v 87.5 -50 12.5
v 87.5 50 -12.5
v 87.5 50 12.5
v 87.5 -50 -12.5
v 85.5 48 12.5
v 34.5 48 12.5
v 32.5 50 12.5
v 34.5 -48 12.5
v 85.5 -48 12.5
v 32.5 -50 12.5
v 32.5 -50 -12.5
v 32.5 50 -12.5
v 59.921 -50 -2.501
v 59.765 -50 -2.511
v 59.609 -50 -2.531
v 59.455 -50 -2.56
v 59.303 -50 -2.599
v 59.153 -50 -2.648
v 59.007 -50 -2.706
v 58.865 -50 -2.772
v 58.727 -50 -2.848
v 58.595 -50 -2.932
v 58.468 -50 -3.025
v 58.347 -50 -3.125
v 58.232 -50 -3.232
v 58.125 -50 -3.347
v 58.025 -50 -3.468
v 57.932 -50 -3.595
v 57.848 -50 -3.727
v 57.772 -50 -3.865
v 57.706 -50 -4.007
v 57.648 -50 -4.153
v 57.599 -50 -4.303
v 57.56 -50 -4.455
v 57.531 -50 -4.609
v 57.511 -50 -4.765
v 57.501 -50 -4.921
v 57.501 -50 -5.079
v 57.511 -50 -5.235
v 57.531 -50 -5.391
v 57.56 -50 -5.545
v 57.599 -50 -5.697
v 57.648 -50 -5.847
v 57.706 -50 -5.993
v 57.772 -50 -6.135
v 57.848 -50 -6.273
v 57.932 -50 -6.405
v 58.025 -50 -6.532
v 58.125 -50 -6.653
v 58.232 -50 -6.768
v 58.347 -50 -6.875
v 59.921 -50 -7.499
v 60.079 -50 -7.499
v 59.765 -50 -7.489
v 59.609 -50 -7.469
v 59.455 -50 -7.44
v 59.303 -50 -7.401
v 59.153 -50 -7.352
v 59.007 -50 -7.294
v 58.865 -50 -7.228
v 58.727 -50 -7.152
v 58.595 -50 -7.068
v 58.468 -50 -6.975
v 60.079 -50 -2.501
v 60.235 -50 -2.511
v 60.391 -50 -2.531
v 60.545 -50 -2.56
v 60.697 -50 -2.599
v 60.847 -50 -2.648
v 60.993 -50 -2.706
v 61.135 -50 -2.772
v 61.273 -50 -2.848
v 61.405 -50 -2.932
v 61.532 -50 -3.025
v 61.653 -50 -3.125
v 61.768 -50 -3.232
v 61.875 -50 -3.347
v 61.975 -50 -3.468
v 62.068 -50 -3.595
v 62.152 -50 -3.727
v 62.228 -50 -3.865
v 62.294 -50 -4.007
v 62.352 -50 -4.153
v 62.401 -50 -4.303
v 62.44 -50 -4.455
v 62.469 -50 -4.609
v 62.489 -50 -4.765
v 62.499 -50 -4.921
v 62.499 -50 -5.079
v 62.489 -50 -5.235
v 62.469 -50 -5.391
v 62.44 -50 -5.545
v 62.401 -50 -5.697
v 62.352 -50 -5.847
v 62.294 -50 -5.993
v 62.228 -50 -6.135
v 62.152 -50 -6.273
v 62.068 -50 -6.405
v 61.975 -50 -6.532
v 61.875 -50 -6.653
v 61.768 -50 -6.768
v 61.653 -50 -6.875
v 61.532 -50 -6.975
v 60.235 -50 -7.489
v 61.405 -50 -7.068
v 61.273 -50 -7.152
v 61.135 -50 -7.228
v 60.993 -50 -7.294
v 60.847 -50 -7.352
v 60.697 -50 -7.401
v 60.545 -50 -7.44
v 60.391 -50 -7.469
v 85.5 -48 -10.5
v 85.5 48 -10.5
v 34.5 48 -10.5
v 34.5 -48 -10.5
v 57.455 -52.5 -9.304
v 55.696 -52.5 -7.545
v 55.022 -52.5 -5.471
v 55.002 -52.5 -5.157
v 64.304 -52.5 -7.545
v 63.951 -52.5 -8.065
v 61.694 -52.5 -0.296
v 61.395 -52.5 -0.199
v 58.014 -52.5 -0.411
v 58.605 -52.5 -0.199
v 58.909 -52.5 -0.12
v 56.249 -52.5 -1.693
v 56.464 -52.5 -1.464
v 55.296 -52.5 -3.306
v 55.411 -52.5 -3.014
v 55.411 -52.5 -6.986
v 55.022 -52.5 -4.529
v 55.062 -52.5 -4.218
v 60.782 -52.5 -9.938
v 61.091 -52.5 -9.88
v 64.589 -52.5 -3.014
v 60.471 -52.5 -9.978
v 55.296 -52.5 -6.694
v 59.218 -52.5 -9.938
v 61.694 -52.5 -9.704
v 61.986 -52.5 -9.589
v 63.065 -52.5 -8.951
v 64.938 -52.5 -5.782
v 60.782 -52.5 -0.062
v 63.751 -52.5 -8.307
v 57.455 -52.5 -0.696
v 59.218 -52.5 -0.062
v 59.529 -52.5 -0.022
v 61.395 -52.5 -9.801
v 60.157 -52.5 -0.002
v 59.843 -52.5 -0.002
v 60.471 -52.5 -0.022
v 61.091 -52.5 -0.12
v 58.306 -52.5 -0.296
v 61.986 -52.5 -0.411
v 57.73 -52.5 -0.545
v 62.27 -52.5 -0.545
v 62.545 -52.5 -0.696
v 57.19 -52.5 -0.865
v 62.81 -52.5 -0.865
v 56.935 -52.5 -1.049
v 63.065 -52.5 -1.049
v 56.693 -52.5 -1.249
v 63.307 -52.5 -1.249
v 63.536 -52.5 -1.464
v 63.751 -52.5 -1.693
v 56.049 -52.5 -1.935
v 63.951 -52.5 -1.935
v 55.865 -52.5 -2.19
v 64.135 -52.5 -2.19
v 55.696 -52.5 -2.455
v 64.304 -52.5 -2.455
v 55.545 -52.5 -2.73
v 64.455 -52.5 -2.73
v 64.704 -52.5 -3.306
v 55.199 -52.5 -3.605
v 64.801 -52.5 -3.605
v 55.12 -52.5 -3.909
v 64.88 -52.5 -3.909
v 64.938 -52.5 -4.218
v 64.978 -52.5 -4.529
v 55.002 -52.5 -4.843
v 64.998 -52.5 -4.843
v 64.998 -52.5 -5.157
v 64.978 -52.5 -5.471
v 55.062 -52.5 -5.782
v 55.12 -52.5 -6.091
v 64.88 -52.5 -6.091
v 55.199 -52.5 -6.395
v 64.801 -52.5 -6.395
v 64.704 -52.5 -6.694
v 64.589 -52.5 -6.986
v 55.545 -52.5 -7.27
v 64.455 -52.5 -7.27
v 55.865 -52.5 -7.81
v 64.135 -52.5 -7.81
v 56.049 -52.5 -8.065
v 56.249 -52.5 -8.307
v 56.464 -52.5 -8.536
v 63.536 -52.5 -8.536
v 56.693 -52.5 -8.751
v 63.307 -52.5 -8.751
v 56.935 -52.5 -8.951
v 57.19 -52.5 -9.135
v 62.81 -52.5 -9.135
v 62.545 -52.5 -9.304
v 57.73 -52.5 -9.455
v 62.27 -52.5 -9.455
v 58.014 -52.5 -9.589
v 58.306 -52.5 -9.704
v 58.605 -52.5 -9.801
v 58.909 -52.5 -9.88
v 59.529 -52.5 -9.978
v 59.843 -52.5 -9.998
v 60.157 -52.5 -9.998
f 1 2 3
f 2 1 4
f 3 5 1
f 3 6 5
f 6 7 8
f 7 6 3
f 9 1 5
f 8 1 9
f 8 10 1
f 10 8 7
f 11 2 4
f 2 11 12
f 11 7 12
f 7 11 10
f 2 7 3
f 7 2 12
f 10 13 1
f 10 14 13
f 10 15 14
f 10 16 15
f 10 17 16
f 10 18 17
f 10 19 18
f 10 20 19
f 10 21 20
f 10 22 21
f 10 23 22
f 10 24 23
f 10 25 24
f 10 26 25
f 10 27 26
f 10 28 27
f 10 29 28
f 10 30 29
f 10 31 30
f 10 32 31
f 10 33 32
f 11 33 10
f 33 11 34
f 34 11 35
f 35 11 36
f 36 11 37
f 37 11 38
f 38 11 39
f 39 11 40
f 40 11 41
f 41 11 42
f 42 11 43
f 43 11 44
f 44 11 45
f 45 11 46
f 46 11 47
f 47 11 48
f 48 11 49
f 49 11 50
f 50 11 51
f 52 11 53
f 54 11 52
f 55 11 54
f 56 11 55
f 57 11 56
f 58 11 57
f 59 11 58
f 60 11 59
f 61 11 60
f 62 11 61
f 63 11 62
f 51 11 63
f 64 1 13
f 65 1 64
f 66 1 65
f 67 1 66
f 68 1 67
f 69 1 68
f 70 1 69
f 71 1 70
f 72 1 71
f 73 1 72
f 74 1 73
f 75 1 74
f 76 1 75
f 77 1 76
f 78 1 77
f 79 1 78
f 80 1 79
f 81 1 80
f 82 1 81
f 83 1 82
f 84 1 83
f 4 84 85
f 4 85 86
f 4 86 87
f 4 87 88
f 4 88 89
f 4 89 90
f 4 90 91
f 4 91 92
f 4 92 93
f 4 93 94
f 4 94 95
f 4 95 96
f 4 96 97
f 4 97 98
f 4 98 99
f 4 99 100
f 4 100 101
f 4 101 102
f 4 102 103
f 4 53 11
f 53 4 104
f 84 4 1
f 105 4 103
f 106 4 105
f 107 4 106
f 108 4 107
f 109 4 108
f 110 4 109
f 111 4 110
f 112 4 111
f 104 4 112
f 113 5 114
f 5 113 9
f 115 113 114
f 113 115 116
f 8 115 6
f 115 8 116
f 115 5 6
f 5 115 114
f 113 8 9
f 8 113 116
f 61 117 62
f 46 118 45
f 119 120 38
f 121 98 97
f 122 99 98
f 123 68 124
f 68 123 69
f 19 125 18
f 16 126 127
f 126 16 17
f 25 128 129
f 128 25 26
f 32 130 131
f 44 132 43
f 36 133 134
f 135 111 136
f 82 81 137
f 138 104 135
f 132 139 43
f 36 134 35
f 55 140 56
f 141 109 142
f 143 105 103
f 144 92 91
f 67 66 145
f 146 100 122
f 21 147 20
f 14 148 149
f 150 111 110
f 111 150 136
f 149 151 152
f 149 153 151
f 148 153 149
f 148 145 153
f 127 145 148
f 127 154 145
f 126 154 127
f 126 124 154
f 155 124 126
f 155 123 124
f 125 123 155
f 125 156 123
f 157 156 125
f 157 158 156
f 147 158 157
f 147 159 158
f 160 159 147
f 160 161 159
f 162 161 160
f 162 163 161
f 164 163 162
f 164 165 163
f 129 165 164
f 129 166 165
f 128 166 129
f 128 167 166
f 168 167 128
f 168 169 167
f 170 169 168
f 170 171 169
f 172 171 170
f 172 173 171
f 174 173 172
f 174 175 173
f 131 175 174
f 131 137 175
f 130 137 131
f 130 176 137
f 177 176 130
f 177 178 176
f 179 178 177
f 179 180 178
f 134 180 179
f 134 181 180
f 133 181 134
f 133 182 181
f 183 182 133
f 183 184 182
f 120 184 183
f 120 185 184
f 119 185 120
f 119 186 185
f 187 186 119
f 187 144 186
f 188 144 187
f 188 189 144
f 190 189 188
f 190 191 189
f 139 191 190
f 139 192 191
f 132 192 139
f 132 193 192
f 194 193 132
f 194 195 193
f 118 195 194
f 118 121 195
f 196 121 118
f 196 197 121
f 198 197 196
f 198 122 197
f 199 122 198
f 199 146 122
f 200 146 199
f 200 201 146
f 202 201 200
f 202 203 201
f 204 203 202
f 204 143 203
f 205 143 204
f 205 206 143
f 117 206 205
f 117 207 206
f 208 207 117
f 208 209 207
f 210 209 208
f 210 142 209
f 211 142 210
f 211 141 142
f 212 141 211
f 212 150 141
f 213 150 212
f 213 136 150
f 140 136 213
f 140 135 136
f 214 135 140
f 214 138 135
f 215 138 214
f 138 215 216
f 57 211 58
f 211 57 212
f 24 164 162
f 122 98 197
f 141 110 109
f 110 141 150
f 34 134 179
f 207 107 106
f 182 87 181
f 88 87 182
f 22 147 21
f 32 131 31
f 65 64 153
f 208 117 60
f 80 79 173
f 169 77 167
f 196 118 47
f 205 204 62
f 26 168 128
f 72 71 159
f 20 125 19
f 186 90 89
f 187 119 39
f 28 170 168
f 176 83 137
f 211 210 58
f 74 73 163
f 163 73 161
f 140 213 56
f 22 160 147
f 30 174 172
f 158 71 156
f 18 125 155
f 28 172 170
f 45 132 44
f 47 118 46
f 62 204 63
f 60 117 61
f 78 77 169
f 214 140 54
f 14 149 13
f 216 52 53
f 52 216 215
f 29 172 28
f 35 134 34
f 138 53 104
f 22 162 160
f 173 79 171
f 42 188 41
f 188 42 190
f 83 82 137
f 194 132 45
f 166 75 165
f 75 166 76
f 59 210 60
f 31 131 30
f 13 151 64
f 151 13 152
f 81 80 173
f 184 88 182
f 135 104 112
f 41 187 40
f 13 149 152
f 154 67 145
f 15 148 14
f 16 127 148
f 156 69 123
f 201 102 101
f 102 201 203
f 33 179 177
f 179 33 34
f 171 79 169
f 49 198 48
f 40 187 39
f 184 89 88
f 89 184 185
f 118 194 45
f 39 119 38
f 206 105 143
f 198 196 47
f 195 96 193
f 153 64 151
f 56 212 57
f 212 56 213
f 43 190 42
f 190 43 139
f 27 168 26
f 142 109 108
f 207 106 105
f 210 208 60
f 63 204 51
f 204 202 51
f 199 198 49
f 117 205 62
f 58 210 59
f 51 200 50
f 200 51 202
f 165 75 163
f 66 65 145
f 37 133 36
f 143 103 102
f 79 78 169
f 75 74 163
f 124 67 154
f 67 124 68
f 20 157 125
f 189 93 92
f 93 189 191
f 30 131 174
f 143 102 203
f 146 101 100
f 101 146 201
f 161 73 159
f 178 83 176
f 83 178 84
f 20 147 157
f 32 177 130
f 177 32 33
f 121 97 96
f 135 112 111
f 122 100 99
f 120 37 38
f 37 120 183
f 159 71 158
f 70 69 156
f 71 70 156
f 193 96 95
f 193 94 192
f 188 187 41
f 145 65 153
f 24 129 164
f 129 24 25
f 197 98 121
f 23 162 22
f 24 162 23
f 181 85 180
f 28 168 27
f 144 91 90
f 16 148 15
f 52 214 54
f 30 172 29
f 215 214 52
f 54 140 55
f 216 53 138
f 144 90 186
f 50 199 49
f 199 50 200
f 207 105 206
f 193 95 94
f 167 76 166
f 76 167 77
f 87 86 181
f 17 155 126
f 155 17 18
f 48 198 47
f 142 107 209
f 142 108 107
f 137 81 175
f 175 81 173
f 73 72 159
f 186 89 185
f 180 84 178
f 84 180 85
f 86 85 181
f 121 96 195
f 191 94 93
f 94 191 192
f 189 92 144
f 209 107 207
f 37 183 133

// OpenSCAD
/////////
//setup//
/////////

// use this to change the space between the holders for x axis
xSpace = 30;

// the number of holders in the x dimention
xHolders = 2;

// use this to change the space between the holders for z axis
zSpace = 30;

// the number of holders in the z dimention
zHolders = 1;

// the tolerance for holding mounts
holderTolerance = .3;

// the lenth of drawers
lenth = 100;

// for tolerance of printer for wall
wallTolerance = 1;

// the thickness of case wall
caseWallThickness = 2;

// if you want the holders to be auto generated
autoGeneratedHolder = 1;

// with of holder
hWith = 5;

//with of side holders
sHWith = 5;

// the thickness of the backplate
bPThickness = 1;

// the thickness for the Top Holder Plate
TopHolderPlateThickness = 1;

// the overlap of Top Holder Plate
TopHolderPlateOverlap = 5;

// the thickness for the right Holder Plate
rightHolderPlateThickness = 1;

// the overlap of right Holder Plate
rightHolderPlateOverlap = 5;

// the thickness of the drawer walls
dWThickness = 2;

// the thickiness of the drawerbottom
dBThickness = 2;

// the diamiter of the knob
kDiamiter = 10;

// the lenth of the knob
kLenth = 2.5;

// the knob type
knobT = 4;

//the offset of the knob(-offset = down and +offset = up )
knobO = -5;

knobR = 2;

knobPlateThickness = 1;

/////////////
//maincode://
/////////////

xlenthDeterminer = xSpace*xHolders;
zlenthDeterminer = zSpace*zHolders;


    
   //////////
   //drawer//
   //////////
   
    module drawerShell(){
        
        drawerCube1 = [
        
        (xlenthDeterminer - (caseWallThickness*2)) - wallTolerance,
        lenth,
        (zlenthDeterminer - (caseWallThickness*2)) - wallTolerance
        
        ];
        
        drawerCube2 = [
        
        (xlenthDeterminer - (caseWallThickness*2)) - (wallTolerance + (dWThickness * 2)),
        lenth - (dWThickness * 2),
        (zlenthDeterminer - (caseWallThickness*2)) - wallTolerance
        
        ];
        
        difference(){
        
            cube(drawerCube1, center = true);
            translate([0, 0, dBThickness]) cube(drawerCube2, center = true);
        }
    }
    
    
    
    module knob(){
        
        kRadius = kDiamiter / 2;
        
        translate([0, -((lenth/2) + (kLenth/2)), knobO]){
        
            rotate(a = [90, 45, 180]){
                
                if(knobT == 1){
                    
                    cylinder(h = kLenth, r1 = kRadius, r2 = kRadius/knobR, $fn = 4 , center = true);
                    
                }
                    
                else{
                    
                    if(knobT == 2){
                    
                    cylinder(h = kLenth, r1 = kRadius, r2 = kRadius/knobR, $fn = 6 , center = true);
                    
                    }
                    
                    else{
                    
                        if(knobT == 3){
                    
                            cylinder(h = kLenth, r1 = kRadius, r2 = kRadius/knobR, $fn = 8 , center = true);
                    
                        }
                        
                        else{
                    
                            if(knobT == 4){
                    
                                cylinder(h = kLenth, r1 = kRadius, r2 = kRadius/knobR, $fn = 100 , center = true);
                    
                            }
                        }
                    }
                }
            }
            
            if(knobT > 4){
                
                cube([kDiamiter/knobR, kLenth, kDiamiter/knobR] , center = true);
                translate([0, (kLenth/2) - (knobPlateThickness / 2) , 0]) cube([kDiamiter, knobPlateThickness, kDiamiter] , center = true);
                
            }
        }
    }
    
    module drawerShellMain(){
    
    drawerShell();
    knob();
        
    }
    
    translate([xlenthDeterminer, 0, 0])drawerShellMain();
